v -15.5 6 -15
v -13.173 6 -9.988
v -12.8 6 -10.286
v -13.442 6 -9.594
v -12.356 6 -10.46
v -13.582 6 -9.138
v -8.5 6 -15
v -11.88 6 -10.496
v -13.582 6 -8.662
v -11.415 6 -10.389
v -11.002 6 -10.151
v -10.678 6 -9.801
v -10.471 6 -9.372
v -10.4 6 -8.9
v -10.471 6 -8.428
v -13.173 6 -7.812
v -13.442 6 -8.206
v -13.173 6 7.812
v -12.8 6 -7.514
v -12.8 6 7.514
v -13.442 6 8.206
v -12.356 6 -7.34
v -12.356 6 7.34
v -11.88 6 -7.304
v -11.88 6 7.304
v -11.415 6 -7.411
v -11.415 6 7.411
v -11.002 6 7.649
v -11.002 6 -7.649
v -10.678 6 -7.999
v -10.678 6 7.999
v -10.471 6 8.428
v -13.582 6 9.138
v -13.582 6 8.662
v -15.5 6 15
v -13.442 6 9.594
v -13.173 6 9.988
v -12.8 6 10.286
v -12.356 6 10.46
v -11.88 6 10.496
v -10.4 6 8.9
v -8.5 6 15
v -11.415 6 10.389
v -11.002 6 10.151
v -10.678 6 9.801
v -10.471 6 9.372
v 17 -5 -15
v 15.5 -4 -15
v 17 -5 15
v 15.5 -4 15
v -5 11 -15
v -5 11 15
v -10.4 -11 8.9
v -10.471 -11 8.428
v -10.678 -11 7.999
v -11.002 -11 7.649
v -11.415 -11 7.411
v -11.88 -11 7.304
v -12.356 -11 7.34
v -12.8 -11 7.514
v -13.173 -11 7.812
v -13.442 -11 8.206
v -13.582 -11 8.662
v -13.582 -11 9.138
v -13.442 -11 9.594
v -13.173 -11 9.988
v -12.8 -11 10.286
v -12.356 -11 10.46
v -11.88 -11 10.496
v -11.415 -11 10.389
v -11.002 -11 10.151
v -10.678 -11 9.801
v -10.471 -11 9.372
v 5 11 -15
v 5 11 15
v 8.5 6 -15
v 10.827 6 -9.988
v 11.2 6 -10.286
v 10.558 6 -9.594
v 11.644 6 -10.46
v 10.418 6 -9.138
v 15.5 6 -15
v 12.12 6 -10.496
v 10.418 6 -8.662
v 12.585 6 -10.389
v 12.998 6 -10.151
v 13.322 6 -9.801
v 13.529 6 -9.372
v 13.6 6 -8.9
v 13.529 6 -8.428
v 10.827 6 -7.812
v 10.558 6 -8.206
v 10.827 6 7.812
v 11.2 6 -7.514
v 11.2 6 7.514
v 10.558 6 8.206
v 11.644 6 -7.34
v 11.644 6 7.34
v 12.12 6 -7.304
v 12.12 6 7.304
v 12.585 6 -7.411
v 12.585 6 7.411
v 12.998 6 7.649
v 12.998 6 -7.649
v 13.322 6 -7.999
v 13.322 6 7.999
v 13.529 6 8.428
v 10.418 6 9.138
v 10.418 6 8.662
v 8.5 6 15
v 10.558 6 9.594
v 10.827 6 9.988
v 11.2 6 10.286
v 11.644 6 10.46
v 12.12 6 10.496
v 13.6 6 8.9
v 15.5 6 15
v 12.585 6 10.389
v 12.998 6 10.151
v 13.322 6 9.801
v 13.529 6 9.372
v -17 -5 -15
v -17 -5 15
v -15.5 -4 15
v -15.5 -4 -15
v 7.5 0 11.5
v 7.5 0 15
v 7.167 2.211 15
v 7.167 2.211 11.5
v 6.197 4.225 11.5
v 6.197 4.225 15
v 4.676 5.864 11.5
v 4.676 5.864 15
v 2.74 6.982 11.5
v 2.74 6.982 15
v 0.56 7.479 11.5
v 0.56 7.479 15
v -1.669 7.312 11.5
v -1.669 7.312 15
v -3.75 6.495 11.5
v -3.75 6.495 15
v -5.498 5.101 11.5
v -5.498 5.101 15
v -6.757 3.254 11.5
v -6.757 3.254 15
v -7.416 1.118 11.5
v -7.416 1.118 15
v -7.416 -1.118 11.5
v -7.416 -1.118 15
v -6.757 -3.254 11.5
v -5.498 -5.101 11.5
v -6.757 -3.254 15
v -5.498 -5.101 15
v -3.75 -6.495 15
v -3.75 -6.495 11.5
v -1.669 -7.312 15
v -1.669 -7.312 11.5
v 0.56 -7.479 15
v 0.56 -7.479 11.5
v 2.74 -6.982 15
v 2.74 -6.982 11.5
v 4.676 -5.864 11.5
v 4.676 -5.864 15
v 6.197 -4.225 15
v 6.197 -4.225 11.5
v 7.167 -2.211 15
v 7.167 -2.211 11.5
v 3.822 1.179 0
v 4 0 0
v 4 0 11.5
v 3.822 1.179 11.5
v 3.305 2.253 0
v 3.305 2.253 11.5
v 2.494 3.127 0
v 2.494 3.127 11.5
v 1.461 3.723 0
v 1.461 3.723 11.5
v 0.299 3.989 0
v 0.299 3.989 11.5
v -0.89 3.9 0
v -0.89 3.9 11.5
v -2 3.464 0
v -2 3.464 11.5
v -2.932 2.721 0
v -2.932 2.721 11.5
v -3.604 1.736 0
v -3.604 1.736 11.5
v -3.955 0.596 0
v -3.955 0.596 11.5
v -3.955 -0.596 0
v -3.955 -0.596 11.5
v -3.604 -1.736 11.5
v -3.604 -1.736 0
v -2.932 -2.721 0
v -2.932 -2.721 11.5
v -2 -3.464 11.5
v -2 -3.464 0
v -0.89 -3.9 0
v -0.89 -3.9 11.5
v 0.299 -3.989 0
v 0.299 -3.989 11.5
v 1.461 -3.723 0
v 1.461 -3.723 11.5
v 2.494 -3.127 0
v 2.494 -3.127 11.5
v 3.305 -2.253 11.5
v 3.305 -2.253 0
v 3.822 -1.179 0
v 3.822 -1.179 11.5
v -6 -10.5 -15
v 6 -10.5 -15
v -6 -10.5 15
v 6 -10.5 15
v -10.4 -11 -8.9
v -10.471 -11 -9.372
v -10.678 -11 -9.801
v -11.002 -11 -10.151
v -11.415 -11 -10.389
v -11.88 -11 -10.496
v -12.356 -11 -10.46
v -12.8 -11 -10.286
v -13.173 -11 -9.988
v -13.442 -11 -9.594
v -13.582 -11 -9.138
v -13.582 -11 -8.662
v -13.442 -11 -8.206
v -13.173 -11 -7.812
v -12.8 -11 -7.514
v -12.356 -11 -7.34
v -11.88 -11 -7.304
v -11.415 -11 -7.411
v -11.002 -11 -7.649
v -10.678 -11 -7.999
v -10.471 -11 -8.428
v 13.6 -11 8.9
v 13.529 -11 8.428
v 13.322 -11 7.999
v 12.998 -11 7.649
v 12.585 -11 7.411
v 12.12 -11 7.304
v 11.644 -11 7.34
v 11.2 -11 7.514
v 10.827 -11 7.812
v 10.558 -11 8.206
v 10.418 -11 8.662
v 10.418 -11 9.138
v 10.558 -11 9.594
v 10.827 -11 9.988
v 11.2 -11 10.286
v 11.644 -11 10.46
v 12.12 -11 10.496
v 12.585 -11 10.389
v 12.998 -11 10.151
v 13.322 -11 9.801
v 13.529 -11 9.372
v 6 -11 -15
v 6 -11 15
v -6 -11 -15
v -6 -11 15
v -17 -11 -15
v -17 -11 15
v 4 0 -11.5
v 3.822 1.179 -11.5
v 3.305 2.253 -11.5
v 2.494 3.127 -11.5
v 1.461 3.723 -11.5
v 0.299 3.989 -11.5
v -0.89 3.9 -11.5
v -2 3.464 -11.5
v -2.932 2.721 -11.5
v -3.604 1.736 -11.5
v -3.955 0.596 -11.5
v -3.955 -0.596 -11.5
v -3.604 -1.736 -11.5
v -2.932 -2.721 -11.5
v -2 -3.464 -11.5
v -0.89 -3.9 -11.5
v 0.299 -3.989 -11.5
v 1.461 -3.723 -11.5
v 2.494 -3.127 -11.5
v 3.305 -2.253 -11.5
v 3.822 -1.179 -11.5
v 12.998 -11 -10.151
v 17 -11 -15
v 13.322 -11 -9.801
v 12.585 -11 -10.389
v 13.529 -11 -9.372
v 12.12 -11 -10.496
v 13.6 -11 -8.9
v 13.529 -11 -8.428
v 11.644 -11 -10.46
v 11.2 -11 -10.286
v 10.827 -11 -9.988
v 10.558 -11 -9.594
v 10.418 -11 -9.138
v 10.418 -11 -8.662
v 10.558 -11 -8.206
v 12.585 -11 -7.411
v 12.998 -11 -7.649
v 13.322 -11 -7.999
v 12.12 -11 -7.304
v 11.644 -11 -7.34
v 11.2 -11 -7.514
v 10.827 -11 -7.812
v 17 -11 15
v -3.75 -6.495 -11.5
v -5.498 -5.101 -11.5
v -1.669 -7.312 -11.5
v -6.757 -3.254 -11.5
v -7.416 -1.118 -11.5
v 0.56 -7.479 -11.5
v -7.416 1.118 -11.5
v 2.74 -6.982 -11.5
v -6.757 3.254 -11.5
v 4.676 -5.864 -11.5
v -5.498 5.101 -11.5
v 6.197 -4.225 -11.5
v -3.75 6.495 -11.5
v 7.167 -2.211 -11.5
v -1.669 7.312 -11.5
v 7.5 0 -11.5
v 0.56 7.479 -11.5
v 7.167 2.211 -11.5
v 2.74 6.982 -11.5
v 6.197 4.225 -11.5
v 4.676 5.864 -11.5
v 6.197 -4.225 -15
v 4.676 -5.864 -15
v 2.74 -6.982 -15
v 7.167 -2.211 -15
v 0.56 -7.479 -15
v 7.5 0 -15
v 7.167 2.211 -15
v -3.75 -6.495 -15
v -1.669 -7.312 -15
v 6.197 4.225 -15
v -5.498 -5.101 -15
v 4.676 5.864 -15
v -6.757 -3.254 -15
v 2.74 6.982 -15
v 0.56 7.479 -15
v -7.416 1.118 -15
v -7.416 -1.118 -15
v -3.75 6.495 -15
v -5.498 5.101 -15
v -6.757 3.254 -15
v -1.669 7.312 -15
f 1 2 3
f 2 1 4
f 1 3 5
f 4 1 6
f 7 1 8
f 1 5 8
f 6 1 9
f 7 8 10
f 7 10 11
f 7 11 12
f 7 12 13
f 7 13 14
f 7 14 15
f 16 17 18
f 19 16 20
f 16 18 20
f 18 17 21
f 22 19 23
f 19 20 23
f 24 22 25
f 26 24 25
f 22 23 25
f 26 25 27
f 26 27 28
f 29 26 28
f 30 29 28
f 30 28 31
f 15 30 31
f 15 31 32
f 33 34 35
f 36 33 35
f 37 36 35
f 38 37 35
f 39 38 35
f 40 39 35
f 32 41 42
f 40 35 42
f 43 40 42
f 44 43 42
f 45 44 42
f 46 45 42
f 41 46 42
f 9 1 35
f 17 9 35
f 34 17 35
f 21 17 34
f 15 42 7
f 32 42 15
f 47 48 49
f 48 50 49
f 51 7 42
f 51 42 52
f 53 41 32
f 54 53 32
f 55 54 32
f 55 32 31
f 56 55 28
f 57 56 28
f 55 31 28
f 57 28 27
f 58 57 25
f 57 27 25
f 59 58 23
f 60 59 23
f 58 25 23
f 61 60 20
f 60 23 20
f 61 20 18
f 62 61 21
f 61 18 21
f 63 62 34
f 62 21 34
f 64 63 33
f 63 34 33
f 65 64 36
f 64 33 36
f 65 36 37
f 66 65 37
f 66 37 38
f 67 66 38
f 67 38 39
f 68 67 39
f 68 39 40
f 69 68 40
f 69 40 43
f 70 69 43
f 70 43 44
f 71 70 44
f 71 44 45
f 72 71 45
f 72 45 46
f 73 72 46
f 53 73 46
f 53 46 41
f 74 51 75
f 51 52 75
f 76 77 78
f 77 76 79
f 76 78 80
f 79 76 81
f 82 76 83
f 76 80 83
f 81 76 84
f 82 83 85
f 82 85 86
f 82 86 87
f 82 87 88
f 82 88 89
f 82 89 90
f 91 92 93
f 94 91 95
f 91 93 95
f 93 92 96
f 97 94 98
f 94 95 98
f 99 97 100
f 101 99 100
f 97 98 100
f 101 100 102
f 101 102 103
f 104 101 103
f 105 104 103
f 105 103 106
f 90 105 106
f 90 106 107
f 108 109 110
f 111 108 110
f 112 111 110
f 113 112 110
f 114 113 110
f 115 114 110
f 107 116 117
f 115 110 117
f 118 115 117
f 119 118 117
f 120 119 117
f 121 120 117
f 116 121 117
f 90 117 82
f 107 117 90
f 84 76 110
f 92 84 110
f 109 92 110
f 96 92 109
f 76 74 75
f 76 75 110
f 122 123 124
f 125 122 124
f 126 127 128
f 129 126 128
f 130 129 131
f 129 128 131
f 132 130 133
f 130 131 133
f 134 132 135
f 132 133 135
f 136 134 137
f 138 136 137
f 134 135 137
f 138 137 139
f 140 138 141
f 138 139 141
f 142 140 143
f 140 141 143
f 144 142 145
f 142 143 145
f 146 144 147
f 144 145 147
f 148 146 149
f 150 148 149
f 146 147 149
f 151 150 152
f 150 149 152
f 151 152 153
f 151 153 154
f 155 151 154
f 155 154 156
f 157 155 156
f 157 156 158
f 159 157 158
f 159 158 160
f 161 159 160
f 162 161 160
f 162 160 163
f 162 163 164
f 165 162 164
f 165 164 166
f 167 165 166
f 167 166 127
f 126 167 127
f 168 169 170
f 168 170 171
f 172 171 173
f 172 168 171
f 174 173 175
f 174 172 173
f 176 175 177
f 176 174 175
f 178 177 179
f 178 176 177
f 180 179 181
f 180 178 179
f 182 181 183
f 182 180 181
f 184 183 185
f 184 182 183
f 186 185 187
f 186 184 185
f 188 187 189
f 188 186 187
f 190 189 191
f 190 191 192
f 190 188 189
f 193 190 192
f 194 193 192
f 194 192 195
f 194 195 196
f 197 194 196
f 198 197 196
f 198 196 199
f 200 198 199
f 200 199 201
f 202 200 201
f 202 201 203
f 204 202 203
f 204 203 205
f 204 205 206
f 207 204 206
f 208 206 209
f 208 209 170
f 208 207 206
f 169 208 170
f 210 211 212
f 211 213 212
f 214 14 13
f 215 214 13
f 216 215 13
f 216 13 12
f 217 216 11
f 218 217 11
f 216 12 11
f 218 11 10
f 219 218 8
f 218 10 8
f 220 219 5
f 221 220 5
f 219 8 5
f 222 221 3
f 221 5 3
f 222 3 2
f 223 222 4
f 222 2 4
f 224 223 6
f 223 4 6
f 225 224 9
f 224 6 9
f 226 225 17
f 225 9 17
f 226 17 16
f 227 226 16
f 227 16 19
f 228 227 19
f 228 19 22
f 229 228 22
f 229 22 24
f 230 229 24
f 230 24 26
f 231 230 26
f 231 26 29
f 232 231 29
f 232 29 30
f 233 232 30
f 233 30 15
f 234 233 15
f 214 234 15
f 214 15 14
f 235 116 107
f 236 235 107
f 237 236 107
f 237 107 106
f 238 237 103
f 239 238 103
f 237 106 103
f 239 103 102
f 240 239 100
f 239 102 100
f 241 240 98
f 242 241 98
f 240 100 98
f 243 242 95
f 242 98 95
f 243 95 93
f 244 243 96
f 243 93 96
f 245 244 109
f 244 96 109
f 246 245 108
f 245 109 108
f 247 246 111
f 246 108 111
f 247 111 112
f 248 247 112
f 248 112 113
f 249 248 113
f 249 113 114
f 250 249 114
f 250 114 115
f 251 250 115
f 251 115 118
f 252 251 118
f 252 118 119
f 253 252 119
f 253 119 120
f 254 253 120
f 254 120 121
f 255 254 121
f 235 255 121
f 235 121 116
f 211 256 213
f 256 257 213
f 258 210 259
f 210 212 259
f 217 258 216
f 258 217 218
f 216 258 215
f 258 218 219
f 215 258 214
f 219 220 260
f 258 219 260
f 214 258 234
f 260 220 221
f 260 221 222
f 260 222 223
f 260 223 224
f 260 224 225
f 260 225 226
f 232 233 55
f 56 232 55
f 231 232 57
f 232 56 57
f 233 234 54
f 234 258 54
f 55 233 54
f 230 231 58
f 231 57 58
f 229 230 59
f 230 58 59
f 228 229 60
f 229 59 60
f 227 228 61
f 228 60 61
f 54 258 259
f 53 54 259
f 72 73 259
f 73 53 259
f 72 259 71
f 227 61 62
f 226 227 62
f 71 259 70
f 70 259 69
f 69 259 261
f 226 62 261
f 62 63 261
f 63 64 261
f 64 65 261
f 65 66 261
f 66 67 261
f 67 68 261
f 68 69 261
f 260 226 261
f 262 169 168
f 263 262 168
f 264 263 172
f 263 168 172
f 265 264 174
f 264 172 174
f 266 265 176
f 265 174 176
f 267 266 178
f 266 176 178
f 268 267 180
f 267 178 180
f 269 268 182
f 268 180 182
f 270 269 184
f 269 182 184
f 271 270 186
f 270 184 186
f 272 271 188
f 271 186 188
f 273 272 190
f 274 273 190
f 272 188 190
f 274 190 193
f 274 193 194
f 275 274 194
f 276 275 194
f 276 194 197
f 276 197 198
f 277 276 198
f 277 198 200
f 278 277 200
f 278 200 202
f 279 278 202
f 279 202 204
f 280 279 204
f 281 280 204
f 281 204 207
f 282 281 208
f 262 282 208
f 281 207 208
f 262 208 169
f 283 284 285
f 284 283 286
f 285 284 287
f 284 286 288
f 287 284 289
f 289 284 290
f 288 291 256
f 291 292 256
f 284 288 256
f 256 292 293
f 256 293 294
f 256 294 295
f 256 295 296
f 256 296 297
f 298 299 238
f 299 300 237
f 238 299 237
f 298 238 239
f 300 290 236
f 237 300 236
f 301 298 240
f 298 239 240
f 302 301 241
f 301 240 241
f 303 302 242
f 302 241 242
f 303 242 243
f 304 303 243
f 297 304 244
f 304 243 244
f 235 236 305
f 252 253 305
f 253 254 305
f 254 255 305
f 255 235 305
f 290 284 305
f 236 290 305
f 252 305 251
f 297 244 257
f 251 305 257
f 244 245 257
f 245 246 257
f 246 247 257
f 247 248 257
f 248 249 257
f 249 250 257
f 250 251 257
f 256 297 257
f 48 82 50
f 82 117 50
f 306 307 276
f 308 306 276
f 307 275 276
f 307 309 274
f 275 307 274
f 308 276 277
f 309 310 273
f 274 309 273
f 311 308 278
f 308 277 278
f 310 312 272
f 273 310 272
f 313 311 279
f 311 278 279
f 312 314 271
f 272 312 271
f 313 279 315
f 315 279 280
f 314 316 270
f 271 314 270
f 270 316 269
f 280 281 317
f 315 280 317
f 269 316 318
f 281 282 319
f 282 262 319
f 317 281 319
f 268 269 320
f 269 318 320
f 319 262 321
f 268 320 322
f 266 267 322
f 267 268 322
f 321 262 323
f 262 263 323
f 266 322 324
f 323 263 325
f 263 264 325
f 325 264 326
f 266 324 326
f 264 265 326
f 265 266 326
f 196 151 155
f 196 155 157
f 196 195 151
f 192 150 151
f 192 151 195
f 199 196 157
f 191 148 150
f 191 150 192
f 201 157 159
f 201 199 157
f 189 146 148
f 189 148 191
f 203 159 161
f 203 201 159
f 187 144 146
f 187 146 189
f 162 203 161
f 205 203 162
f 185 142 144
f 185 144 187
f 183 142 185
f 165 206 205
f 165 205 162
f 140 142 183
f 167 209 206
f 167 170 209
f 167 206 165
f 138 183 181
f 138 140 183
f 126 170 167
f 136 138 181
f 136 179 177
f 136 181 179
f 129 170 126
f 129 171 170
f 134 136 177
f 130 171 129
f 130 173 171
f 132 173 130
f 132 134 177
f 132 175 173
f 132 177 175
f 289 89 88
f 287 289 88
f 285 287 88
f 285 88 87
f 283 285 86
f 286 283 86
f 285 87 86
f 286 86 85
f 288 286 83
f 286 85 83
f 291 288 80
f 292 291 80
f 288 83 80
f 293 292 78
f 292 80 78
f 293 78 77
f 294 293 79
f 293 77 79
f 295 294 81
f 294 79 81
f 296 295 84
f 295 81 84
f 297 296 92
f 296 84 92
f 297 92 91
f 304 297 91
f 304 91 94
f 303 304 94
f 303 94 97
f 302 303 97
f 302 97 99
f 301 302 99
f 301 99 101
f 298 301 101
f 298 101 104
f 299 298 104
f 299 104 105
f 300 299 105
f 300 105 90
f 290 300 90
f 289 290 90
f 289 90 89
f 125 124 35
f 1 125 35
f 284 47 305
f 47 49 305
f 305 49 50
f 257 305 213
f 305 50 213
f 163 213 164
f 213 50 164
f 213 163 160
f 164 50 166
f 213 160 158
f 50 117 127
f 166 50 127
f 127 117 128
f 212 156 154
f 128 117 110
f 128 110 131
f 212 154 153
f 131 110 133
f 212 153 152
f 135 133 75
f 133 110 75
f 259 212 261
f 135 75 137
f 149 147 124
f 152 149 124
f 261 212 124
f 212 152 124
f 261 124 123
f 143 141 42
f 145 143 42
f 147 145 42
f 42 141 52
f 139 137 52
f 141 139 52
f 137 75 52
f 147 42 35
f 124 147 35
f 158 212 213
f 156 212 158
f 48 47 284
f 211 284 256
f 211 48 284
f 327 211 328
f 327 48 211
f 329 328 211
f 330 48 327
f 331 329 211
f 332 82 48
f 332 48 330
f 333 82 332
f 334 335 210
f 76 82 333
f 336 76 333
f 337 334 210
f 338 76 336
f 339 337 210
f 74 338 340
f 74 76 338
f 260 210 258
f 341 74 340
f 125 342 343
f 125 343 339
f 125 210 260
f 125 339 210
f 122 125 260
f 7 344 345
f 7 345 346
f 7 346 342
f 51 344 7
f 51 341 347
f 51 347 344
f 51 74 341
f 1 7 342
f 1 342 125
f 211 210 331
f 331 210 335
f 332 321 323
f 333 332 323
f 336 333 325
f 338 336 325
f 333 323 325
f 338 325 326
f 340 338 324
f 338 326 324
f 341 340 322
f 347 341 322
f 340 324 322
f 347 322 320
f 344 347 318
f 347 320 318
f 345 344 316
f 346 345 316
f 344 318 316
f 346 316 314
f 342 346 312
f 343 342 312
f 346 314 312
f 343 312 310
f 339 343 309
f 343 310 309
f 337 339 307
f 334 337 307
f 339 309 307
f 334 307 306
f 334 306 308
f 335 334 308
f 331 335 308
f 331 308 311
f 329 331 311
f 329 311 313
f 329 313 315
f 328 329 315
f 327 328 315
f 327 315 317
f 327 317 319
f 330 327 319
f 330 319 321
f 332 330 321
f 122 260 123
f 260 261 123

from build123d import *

# Parameters (mm, degrees)
Y_KSEKLIK_EKSTR_ZYON1_DEPTH      = 15
Y_KSEKLIK_EKSTR_ZYON1_DEPTH_BACK = 15
IZIM2_R                          = 7.5
KES_EKSTR_ZYON1_DEPTH            = 37.193922142
Y_KSEKLIK_EKSTR_ZYON2_DEPTH      = 11.5
Y_KSEKLIK_EKSTR_ZYON2_DEPTH_BACK = 11.5
IZIM3_R                          = 7.5
IZIM3_R_2                        = 4
IZIM4_R                          = 1.6
KES_EKSTR_ZYON2_DEPTH            = 29.337254631


with BuildPart() as part:
    # Çizim1 → Yükseklik-Ekstrüzyon1 (new, two sides: drawn at the far end of the back side and taken through both)
    with BuildSketch(Plane.XY.offset(-Y_KSEKLIK_EKSTR_ZYON1_DEPTH_BACK)):
        Polygon((-15.5, 6), (-8.5, 6), (-5, 11), (5, 11), (8.5, 6), (15.5, 6), (15.5, -4), (17, -5), (17, -11), (6, -11), (6, -10.5), (-6, -10.5), (-6, -11), (-17, -11), (-17, -5), (-15.5, -4), align=None)
    extrude(amount=Y_KSEKLIK_EKSTR_ZYON1_DEPTH + Y_KSEKLIK_EKSTR_ZYON1_DEPTH_BACK)

    # Çizim2 → Kes-Ekstrüzyon1 (cut, through all)
    with BuildSketch(Plane.XY.offset(15)):
        Circle(IZIM2_R)
    extrude(amount=-KES_EKSTR_ZYON1_DEPTH, mode=Mode.SUBTRACT)

    # Çizim3 → Yükseklik-Ekstrüzyon2 (add, two sides: drawn at the far end of the back side and taken through both)
    with BuildSketch(Plane.XY.offset(-Y_KSEKLIK_EKSTR_ZYON2_DEPTH_BACK)):
        Circle(IZIM3_R)
        Circle(IZIM3_R_2, mode=Mode.SUBTRACT)
    extrude(amount=Y_KSEKLIK_EKSTR_ZYON2_DEPTH + Y_KSEKLIK_EKSTR_ZYON2_DEPTH_BACK)

    # Çizim4 → Kes-Ekstrüzyon2 (cut, through all)
    with BuildSketch(Plane(origin=(0, 6, 0), x_dir=(1, 0, 0), z_dir=(0, 1, 0))):
        with Locations((-12, 8.9)):
            Circle(IZIM4_R)
        with Locations((-12, -8.9)):
            Circle(IZIM4_R)
        with Locations((12, -8.9)):
            Circle(IZIM4_R)
        with Locations((12, 8.9)):
            Circle(IZIM4_R)
    extrude(amount=-KES_EKSTR_ZYON2_DEPTH, mode=Mode.SUBTRACT)


solid = part.part
